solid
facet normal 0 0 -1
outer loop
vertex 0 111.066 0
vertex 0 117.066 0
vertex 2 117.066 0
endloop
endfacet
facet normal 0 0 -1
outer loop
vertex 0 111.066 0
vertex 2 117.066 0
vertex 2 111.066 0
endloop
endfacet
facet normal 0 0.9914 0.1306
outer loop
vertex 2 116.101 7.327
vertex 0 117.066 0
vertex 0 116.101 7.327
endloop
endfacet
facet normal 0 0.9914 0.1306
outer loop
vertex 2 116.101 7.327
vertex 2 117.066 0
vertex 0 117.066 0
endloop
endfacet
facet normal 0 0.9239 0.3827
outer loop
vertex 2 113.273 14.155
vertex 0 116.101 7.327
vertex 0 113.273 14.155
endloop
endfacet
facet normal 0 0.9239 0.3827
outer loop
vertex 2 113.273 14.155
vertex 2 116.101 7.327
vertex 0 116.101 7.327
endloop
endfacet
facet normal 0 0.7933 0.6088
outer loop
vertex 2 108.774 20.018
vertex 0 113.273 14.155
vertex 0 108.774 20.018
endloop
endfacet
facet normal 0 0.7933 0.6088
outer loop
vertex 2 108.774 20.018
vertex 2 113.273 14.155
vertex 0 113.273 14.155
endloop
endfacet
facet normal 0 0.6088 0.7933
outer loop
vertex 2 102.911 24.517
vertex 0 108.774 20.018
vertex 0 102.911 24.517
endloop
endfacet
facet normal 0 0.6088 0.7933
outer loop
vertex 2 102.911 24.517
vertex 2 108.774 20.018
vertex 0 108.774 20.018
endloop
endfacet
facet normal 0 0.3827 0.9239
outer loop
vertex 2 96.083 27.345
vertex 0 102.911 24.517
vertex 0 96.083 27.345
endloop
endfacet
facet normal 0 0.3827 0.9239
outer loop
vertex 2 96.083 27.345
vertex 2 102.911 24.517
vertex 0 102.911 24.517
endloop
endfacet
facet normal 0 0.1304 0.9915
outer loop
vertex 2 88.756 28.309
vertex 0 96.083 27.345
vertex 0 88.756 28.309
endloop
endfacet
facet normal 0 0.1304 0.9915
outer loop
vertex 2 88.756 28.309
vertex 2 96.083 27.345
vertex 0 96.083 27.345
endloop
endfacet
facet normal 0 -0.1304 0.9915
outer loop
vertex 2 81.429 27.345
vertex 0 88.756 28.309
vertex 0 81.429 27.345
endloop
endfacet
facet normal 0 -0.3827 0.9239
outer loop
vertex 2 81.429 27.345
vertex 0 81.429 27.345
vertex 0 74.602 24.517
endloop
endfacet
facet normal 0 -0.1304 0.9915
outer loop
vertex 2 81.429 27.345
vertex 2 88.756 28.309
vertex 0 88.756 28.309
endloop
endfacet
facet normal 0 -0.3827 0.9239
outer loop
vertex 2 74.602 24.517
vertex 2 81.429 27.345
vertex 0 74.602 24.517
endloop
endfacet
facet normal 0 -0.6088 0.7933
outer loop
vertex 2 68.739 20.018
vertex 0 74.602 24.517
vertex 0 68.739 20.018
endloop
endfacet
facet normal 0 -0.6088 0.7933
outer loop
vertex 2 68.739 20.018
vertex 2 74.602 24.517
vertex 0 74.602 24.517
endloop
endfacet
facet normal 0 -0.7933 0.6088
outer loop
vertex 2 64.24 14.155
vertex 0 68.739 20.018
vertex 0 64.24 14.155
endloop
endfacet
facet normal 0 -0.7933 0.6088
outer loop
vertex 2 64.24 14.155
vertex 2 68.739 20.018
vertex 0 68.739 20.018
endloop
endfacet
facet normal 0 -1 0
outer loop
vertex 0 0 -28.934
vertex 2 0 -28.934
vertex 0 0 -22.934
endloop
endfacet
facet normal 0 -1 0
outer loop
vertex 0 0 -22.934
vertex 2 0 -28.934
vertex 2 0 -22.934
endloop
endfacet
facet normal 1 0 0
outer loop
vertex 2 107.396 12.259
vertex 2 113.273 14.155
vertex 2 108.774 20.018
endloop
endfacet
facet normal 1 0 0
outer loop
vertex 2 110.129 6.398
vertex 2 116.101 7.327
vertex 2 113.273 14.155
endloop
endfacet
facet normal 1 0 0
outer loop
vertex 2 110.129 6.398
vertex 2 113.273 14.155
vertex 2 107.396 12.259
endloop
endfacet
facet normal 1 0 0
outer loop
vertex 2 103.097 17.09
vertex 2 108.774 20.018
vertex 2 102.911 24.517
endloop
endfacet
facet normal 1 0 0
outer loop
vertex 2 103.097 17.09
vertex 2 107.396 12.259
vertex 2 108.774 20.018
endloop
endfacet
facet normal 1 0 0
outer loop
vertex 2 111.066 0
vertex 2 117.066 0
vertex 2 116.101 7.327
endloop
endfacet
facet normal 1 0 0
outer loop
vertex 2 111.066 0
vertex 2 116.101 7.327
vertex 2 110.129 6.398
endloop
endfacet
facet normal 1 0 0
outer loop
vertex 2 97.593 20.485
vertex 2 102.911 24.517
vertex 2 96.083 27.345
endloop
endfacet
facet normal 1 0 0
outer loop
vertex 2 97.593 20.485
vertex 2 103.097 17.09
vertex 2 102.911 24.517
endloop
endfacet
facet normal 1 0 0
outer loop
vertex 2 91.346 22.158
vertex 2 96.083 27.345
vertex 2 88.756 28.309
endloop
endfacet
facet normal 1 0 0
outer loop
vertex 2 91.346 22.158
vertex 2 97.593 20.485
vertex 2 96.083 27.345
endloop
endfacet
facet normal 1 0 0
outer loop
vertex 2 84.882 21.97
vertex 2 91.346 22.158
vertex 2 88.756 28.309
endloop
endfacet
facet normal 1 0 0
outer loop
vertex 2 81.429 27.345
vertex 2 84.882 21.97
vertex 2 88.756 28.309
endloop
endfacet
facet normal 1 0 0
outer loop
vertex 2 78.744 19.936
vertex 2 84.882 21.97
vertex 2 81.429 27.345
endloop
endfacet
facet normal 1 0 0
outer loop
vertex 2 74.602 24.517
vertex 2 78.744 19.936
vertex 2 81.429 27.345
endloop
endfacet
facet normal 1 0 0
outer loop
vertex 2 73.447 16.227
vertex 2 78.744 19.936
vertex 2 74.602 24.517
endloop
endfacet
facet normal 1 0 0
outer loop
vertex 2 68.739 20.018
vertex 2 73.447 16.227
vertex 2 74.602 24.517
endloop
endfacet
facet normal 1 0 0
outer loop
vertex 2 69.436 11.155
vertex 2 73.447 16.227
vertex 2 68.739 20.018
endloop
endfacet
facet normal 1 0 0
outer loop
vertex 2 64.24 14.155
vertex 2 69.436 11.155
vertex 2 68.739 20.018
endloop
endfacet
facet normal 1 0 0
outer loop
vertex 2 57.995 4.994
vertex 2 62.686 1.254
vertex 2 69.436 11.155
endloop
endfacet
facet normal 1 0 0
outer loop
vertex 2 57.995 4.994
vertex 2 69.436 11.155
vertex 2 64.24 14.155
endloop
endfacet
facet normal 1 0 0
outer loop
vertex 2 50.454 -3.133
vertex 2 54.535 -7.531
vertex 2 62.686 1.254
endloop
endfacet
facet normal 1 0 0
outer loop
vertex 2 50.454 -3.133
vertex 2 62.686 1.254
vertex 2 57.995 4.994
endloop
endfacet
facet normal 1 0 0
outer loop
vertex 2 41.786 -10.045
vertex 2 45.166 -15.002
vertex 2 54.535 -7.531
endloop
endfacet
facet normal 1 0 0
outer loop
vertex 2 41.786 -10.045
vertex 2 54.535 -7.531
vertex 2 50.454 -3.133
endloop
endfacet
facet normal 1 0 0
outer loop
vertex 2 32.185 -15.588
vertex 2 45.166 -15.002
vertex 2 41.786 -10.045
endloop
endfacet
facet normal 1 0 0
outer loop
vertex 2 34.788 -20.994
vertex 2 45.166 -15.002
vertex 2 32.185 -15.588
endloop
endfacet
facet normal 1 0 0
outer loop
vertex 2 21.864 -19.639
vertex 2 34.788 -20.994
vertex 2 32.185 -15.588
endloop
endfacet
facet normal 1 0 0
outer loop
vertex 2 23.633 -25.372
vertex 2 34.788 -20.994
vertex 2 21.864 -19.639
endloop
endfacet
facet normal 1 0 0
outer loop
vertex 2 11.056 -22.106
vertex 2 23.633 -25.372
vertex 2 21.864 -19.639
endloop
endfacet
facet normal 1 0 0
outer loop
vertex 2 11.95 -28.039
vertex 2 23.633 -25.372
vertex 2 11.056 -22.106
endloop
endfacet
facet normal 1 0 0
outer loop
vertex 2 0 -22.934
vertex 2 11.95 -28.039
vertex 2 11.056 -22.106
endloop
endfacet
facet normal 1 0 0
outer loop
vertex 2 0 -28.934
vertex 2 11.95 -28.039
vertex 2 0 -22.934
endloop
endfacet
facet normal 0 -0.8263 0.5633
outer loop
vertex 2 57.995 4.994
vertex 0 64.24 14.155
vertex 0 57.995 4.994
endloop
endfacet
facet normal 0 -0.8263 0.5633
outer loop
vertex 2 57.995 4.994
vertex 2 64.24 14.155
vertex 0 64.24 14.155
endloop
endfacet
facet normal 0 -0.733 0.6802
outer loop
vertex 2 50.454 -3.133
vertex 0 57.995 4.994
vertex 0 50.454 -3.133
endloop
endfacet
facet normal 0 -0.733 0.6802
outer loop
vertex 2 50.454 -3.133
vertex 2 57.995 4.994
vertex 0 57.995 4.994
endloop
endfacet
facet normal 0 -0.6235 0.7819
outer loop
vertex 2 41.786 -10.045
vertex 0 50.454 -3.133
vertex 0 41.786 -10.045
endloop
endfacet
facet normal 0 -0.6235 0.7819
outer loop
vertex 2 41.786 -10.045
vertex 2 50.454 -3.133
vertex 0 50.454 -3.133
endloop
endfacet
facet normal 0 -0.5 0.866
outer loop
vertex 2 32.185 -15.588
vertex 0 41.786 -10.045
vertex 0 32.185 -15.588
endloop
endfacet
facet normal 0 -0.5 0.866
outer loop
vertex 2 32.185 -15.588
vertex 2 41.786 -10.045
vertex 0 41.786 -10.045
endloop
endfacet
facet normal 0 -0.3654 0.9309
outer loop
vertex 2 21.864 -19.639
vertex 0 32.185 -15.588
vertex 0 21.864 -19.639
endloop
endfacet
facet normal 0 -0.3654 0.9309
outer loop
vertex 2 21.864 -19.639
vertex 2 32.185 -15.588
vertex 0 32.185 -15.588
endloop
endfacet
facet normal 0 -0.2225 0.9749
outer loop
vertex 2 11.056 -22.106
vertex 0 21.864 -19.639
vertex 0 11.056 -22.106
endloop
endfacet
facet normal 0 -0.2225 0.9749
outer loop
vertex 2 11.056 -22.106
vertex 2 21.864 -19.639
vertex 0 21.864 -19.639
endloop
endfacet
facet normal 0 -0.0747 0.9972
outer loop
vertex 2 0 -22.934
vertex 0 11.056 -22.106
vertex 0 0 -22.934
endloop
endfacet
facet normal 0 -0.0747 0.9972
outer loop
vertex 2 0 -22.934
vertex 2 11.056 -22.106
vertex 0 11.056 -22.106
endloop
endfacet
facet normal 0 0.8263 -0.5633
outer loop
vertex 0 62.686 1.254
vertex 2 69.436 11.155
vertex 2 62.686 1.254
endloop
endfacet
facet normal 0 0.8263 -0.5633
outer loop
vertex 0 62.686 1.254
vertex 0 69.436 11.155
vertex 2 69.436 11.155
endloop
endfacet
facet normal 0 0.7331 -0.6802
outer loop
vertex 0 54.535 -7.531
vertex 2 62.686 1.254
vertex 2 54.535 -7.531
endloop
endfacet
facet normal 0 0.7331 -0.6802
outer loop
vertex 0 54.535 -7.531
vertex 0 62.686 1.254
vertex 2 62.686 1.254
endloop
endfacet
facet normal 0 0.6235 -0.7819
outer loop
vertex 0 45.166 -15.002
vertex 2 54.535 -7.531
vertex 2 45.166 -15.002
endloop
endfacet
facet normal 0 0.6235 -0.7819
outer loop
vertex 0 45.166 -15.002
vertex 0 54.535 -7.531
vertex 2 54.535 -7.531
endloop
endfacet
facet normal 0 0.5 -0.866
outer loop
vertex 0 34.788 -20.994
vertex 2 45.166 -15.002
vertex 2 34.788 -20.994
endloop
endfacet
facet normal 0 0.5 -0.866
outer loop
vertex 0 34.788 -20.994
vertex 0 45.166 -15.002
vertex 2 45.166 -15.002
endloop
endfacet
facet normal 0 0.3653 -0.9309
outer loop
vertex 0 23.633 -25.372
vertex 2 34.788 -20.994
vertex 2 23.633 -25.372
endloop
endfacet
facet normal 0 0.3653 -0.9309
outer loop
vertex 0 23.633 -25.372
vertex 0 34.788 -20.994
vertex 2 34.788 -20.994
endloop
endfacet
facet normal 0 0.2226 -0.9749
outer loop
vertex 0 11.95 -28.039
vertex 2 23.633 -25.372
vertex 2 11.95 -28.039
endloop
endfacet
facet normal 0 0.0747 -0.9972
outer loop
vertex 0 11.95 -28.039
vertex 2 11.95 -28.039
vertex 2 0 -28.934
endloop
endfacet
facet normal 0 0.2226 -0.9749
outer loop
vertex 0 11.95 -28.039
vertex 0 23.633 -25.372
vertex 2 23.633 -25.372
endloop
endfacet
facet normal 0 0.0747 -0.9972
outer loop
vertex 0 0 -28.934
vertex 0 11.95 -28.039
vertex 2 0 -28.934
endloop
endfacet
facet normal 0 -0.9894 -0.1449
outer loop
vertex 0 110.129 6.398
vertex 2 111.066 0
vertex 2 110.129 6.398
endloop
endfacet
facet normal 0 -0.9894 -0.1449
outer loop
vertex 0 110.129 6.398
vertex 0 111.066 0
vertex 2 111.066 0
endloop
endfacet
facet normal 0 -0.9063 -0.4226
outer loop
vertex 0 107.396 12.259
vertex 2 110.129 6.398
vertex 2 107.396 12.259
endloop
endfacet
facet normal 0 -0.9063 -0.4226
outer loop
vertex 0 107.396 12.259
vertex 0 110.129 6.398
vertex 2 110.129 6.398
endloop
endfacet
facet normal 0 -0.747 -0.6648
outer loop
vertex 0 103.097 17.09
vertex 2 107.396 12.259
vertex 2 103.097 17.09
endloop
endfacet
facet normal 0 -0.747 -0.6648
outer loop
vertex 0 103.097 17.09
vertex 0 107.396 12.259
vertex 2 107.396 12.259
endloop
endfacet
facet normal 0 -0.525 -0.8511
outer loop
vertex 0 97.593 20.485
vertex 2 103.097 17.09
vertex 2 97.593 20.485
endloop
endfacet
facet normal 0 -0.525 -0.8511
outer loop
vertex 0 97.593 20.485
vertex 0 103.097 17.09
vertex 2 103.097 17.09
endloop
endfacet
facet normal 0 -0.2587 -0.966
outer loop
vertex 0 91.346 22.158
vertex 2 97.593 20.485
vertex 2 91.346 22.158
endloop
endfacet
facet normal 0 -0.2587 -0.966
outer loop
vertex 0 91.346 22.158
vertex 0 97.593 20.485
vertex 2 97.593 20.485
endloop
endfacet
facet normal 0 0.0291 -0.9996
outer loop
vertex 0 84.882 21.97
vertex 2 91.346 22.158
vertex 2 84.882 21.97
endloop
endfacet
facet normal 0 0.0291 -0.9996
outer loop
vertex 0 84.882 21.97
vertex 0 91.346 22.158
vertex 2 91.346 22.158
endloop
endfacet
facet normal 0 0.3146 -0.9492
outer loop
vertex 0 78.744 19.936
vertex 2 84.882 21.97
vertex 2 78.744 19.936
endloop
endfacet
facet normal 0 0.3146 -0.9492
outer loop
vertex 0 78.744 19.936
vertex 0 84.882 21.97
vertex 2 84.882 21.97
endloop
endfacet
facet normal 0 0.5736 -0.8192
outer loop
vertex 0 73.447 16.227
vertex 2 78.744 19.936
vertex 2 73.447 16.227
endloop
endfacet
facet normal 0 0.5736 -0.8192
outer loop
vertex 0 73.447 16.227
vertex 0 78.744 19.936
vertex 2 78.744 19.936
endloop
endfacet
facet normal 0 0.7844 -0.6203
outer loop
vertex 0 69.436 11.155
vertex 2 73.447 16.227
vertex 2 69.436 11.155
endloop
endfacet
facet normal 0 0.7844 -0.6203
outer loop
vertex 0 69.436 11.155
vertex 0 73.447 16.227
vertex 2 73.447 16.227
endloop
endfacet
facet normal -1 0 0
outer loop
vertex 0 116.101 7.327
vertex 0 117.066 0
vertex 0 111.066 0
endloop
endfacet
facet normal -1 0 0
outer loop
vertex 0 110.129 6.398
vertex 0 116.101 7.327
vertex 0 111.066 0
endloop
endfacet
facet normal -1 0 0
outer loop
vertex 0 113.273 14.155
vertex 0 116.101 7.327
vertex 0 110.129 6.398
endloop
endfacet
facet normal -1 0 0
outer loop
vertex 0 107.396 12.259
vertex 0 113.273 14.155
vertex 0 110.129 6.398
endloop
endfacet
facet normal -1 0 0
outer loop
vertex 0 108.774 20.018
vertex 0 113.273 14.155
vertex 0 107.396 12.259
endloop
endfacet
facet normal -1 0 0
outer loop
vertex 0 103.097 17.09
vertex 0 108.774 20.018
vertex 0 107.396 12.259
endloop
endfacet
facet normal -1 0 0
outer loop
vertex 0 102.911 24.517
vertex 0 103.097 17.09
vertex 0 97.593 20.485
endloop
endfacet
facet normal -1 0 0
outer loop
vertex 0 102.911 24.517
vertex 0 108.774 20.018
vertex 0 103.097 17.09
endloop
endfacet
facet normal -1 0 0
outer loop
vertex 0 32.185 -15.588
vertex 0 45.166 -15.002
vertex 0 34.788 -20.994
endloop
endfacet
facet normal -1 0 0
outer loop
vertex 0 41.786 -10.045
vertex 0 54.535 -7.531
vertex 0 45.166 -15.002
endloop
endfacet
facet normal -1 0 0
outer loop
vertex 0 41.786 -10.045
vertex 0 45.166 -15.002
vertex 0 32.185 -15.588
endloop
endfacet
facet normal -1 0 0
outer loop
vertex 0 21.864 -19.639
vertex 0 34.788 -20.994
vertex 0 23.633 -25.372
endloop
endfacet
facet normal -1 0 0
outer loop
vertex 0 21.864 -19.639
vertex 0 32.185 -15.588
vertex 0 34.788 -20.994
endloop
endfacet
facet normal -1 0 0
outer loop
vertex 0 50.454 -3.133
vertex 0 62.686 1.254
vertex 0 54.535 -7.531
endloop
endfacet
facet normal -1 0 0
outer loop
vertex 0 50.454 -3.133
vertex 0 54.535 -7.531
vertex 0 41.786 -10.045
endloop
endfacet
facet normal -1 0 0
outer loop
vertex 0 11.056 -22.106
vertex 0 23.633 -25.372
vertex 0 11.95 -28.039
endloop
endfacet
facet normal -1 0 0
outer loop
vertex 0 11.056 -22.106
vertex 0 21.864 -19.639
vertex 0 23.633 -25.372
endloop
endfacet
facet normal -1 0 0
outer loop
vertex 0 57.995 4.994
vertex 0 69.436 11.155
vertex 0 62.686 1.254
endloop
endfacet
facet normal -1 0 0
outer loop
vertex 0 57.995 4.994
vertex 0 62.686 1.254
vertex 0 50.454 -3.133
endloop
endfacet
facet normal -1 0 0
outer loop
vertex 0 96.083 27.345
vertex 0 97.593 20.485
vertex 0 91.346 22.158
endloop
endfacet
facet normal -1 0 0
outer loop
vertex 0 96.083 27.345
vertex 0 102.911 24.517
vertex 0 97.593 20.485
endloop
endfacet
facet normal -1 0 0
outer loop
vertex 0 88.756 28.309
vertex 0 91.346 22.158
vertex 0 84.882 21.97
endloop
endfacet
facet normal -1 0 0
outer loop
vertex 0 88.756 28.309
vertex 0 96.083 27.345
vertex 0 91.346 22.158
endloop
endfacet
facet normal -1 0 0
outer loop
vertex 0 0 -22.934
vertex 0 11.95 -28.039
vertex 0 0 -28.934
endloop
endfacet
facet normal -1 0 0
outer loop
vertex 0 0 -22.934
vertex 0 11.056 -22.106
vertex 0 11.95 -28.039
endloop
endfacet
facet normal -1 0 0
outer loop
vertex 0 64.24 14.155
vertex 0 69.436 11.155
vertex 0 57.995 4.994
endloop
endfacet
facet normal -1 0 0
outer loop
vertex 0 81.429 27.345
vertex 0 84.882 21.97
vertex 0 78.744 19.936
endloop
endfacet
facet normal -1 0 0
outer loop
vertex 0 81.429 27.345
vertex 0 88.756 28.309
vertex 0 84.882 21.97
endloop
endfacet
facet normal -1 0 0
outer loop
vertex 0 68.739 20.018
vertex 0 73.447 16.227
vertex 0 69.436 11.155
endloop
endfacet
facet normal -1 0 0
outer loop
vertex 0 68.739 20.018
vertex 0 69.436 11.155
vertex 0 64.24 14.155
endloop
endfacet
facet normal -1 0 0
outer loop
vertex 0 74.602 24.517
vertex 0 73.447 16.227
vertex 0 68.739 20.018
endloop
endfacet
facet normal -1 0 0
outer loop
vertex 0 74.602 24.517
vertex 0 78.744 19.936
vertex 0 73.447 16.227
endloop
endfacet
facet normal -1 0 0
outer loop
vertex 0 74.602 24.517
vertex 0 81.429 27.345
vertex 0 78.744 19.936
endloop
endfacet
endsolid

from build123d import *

# Parameters (mm, degrees)
SKETCH2_W = 2
SKETCH2_H = 6


with BuildPart() as part:
    # Sweep1: sweep along a path in Sketch1
    with BuildLine(Plane(origin=(0, 0, 0), x_dir=(0, 0, -1), z_dir=(1, 0, 0))) as sweep1_path:
        ThreePointArc((0, 117), (-27.281180678, 96.066413802), (-14.121778265, 64.296806022))
        ThreePointArc((-14.121778265, 64.296806022), (13.053249492, 37.121778265), (23, 0))
    # Sketch2 → Sweep1 (sweep)
    with BuildSketch(Plane(origin=(0, 0, 0), x_dir=(1, 0, 0), z_dir=(0, 1, 0))):
        with Locations((1, 25.934217786)):
            Rectangle(SKETCH2_W, SKETCH2_H)
    sweep(path=sweep1_path.line)


solid = part.part
